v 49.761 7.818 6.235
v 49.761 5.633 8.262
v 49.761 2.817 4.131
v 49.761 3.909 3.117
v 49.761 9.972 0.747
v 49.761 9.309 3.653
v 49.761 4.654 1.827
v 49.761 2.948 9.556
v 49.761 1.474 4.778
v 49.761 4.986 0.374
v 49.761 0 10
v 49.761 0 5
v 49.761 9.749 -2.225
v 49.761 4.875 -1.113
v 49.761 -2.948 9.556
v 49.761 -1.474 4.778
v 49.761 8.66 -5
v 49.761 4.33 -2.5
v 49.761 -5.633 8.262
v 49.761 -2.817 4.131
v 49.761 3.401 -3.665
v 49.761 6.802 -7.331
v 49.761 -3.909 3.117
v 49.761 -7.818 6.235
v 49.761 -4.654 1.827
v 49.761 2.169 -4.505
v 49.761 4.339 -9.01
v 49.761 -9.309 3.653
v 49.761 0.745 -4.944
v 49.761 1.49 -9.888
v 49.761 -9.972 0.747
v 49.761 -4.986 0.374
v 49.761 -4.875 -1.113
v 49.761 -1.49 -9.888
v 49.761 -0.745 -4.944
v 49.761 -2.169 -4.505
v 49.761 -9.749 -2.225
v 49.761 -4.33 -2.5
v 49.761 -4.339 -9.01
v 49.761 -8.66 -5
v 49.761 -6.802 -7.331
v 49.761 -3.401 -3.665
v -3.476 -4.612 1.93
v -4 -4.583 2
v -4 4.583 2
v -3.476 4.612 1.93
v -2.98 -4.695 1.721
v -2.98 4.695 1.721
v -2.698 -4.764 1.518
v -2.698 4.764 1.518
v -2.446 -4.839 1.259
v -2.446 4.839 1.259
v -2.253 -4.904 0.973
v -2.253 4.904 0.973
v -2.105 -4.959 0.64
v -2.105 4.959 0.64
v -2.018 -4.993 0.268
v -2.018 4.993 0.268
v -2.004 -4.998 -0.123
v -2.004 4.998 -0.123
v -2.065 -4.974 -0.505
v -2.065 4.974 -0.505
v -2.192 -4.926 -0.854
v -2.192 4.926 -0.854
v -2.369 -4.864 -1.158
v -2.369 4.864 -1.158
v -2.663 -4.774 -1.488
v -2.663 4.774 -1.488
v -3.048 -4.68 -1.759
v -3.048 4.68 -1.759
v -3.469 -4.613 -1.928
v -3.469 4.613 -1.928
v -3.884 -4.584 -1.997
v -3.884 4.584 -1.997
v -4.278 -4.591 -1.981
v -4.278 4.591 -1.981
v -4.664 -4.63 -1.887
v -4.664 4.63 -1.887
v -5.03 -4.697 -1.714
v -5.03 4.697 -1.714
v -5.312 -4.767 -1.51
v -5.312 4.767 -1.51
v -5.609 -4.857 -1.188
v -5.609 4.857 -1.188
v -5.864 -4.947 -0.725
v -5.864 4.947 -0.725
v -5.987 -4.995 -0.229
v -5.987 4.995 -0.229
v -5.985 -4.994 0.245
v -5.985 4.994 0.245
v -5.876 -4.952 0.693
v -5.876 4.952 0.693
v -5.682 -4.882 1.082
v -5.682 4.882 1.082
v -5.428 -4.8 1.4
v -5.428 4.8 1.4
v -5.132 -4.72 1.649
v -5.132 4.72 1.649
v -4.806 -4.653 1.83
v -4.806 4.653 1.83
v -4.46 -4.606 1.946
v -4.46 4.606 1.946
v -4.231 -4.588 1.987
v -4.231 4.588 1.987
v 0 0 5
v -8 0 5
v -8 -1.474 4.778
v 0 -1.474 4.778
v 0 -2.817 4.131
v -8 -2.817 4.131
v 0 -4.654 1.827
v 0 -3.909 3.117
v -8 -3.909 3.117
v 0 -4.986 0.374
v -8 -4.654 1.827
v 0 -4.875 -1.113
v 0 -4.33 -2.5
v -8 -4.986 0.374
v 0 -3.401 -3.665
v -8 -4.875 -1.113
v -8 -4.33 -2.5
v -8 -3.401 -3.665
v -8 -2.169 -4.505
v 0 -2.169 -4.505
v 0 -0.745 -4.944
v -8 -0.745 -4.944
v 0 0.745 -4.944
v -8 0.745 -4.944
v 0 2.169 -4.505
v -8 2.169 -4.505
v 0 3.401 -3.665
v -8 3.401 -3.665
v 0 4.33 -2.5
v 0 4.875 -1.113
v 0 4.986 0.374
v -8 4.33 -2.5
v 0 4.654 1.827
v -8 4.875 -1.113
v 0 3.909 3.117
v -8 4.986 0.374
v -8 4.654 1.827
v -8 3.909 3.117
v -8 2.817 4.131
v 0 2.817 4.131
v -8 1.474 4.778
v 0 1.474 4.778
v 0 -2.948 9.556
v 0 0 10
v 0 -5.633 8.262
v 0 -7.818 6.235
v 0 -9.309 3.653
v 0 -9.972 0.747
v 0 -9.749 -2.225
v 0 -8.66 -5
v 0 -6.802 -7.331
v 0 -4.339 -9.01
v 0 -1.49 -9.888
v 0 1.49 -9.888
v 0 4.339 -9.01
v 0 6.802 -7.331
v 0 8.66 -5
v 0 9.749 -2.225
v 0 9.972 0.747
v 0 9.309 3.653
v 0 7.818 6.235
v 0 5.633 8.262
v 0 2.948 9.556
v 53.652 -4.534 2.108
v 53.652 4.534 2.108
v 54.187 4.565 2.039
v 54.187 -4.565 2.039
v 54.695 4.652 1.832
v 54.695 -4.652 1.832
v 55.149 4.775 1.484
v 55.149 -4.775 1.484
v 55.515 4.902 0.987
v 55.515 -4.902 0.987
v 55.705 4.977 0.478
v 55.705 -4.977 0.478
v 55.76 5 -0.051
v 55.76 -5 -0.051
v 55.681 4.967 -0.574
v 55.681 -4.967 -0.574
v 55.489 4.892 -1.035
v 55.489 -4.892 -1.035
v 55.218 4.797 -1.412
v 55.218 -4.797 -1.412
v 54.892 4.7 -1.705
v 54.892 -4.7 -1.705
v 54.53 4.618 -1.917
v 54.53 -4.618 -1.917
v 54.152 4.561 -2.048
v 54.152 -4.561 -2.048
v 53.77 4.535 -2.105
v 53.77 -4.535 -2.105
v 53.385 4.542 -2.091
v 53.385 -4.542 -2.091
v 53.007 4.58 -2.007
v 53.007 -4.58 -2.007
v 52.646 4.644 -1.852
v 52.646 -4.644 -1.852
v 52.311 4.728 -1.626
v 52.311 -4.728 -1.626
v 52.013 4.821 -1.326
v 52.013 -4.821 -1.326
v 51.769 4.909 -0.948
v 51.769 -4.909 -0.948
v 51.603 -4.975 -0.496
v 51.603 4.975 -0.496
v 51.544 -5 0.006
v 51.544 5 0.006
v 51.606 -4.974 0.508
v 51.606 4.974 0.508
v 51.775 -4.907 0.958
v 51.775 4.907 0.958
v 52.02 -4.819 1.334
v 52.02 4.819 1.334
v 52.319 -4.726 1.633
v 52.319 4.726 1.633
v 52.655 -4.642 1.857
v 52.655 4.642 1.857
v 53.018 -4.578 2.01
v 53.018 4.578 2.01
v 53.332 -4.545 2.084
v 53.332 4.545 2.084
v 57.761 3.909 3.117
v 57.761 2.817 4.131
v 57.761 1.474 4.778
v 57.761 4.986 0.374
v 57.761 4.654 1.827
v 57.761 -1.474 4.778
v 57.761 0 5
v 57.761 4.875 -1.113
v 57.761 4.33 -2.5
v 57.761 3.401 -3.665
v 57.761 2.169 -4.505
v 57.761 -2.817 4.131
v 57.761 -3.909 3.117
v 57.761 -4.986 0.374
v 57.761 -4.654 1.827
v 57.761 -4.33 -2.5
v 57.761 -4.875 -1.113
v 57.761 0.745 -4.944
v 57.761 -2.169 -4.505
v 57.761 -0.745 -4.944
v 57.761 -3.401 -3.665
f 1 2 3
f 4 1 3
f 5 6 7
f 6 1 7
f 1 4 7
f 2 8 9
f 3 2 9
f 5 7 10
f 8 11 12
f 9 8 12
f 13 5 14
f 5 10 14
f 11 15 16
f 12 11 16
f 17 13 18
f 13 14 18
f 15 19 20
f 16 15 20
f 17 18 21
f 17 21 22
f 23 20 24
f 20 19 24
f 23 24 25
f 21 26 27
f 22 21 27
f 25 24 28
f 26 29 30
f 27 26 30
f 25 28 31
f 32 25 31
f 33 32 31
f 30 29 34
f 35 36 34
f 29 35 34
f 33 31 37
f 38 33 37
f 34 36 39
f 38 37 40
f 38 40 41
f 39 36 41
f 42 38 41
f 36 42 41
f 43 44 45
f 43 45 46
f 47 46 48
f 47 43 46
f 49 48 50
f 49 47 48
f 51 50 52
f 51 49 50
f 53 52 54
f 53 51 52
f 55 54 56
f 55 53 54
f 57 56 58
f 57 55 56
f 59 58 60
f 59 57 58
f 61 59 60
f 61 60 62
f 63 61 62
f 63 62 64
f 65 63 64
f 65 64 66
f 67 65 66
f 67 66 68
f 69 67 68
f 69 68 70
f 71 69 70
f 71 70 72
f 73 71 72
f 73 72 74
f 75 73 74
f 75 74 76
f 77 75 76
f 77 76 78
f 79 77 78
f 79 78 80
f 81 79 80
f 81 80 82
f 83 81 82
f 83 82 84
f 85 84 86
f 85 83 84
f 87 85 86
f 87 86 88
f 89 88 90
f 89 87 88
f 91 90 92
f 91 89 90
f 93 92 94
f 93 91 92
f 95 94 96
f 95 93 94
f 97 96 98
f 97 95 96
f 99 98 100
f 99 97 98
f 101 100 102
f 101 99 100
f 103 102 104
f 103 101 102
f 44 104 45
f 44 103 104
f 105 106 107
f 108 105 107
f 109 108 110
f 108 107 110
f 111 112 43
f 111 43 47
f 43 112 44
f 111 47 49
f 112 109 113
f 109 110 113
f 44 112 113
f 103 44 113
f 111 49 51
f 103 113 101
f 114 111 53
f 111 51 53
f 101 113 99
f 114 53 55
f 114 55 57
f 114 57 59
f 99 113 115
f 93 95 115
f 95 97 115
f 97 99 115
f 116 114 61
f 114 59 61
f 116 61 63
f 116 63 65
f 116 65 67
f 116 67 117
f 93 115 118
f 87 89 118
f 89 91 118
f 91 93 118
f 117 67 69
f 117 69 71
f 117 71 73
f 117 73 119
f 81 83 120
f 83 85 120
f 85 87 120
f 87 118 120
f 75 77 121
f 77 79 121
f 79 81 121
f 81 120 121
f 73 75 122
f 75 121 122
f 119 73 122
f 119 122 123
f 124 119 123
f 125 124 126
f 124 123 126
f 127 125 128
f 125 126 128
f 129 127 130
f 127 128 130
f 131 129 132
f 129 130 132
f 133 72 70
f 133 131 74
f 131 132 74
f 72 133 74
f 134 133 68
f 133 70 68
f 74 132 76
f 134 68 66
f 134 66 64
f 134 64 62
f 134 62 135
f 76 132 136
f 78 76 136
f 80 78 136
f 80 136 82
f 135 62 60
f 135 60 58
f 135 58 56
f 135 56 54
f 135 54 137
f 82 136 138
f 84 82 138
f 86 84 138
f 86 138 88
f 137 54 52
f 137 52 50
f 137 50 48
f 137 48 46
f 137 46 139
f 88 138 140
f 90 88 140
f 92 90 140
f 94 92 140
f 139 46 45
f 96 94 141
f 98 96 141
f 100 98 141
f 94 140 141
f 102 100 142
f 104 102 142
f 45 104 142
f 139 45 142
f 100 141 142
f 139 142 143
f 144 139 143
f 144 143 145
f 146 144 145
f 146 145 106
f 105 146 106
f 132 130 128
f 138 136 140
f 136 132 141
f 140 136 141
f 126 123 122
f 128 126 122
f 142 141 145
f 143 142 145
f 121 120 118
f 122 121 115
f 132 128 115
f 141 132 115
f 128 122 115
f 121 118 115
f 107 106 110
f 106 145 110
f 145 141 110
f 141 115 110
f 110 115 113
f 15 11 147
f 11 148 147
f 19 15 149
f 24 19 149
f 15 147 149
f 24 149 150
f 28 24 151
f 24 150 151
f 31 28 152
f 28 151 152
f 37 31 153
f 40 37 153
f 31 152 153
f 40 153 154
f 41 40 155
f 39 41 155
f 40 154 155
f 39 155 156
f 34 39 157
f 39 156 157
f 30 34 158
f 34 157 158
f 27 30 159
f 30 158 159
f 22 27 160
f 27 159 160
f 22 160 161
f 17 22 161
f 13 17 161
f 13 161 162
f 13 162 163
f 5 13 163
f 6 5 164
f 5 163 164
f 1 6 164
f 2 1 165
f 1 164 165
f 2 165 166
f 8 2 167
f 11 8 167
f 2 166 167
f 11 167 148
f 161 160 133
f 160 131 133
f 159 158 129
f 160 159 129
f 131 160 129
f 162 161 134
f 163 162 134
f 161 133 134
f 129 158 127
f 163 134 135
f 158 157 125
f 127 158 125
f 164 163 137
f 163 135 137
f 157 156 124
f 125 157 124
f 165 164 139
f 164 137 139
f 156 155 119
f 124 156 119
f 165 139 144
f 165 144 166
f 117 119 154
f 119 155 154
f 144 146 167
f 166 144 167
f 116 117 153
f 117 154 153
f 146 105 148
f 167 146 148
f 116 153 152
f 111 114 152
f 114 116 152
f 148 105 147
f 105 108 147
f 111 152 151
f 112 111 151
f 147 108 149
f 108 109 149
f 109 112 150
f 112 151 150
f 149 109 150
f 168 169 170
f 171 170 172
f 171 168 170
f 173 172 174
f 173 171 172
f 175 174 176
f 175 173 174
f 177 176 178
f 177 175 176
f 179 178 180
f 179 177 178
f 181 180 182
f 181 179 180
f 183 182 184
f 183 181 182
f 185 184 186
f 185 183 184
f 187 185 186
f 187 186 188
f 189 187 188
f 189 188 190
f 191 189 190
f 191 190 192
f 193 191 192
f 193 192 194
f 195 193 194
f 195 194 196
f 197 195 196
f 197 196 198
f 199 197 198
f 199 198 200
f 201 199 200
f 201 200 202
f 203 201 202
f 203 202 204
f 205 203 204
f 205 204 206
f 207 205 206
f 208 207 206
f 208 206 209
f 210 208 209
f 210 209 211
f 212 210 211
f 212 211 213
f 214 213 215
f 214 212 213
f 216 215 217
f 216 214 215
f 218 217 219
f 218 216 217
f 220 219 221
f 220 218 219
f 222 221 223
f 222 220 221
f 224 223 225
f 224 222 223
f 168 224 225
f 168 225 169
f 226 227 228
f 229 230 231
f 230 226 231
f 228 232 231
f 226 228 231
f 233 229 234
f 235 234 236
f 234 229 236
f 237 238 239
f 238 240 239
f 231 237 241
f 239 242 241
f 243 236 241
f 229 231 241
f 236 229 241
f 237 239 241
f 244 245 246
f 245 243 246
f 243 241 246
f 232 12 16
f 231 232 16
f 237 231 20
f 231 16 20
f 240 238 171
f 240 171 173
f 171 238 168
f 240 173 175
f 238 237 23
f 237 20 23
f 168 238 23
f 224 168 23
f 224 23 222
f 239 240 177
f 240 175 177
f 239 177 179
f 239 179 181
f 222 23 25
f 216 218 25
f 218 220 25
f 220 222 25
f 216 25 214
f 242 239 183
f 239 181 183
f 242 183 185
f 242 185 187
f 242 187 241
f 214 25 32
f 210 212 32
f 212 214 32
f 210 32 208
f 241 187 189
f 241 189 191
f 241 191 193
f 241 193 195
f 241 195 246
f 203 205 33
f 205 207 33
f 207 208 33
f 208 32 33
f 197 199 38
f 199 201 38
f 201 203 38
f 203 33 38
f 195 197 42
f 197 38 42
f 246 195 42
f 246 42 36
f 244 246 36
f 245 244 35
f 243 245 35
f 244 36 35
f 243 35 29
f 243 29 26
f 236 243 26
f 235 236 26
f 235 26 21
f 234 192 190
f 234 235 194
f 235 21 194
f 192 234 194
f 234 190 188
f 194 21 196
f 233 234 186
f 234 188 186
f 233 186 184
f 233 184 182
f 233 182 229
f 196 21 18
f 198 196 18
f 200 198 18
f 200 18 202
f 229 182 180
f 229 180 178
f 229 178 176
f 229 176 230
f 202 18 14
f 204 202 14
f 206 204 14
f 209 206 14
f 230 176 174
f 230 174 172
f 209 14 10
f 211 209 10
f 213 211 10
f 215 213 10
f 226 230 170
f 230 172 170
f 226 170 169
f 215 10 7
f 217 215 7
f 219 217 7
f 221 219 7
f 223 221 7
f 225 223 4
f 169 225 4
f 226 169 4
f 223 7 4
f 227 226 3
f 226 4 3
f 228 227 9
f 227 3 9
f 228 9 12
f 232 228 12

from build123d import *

# Parameters (mm, degrees)
CUT_EXTRUDE1_DEPTH      = 10
CUT_EXTRUDE1_DEPTH_BACK = 10
SKETCH2_R               = 2
SKETCH2_R_2             = 2.107972828


with BuildPart() as part:
    # Sketch1 → Revolve1 (revolve)
    with BuildSketch(Plane.XY):
        Polygon((0, 0), (50, 0), (57.761374705, 0), (57.761374705, 5), (49.761374705, 5), (49.761374705, 10), (0, 10), (0, 5), (-8, 5), (-8, 0), align=None)
    revolve(axis=Axis((0, 0, 0), (1, 0, 0)))

    # Sketch2 → Cut-Extrude1 (cut, two sides: drawn at the far end of the back side and taken through both)
    with BuildSketch(Plane(origin=(0, 0, 0), x_dir=(1, 0, 0), z_dir=(0, 1, 0)).offset(-CUT_EXTRUDE1_DEPTH_BACK)):
        with Locations((-4, 0)):
            Circle(SKETCH2_R)
        with Locations((53.652209211, 0)):
            Circle(SKETCH2_R_2)
    extrude(amount=CUT_EXTRUDE1_DEPTH + CUT_EXTRUDE1_DEPTH_BACK, mode=Mode.SUBTRACT)


solid = part.part
